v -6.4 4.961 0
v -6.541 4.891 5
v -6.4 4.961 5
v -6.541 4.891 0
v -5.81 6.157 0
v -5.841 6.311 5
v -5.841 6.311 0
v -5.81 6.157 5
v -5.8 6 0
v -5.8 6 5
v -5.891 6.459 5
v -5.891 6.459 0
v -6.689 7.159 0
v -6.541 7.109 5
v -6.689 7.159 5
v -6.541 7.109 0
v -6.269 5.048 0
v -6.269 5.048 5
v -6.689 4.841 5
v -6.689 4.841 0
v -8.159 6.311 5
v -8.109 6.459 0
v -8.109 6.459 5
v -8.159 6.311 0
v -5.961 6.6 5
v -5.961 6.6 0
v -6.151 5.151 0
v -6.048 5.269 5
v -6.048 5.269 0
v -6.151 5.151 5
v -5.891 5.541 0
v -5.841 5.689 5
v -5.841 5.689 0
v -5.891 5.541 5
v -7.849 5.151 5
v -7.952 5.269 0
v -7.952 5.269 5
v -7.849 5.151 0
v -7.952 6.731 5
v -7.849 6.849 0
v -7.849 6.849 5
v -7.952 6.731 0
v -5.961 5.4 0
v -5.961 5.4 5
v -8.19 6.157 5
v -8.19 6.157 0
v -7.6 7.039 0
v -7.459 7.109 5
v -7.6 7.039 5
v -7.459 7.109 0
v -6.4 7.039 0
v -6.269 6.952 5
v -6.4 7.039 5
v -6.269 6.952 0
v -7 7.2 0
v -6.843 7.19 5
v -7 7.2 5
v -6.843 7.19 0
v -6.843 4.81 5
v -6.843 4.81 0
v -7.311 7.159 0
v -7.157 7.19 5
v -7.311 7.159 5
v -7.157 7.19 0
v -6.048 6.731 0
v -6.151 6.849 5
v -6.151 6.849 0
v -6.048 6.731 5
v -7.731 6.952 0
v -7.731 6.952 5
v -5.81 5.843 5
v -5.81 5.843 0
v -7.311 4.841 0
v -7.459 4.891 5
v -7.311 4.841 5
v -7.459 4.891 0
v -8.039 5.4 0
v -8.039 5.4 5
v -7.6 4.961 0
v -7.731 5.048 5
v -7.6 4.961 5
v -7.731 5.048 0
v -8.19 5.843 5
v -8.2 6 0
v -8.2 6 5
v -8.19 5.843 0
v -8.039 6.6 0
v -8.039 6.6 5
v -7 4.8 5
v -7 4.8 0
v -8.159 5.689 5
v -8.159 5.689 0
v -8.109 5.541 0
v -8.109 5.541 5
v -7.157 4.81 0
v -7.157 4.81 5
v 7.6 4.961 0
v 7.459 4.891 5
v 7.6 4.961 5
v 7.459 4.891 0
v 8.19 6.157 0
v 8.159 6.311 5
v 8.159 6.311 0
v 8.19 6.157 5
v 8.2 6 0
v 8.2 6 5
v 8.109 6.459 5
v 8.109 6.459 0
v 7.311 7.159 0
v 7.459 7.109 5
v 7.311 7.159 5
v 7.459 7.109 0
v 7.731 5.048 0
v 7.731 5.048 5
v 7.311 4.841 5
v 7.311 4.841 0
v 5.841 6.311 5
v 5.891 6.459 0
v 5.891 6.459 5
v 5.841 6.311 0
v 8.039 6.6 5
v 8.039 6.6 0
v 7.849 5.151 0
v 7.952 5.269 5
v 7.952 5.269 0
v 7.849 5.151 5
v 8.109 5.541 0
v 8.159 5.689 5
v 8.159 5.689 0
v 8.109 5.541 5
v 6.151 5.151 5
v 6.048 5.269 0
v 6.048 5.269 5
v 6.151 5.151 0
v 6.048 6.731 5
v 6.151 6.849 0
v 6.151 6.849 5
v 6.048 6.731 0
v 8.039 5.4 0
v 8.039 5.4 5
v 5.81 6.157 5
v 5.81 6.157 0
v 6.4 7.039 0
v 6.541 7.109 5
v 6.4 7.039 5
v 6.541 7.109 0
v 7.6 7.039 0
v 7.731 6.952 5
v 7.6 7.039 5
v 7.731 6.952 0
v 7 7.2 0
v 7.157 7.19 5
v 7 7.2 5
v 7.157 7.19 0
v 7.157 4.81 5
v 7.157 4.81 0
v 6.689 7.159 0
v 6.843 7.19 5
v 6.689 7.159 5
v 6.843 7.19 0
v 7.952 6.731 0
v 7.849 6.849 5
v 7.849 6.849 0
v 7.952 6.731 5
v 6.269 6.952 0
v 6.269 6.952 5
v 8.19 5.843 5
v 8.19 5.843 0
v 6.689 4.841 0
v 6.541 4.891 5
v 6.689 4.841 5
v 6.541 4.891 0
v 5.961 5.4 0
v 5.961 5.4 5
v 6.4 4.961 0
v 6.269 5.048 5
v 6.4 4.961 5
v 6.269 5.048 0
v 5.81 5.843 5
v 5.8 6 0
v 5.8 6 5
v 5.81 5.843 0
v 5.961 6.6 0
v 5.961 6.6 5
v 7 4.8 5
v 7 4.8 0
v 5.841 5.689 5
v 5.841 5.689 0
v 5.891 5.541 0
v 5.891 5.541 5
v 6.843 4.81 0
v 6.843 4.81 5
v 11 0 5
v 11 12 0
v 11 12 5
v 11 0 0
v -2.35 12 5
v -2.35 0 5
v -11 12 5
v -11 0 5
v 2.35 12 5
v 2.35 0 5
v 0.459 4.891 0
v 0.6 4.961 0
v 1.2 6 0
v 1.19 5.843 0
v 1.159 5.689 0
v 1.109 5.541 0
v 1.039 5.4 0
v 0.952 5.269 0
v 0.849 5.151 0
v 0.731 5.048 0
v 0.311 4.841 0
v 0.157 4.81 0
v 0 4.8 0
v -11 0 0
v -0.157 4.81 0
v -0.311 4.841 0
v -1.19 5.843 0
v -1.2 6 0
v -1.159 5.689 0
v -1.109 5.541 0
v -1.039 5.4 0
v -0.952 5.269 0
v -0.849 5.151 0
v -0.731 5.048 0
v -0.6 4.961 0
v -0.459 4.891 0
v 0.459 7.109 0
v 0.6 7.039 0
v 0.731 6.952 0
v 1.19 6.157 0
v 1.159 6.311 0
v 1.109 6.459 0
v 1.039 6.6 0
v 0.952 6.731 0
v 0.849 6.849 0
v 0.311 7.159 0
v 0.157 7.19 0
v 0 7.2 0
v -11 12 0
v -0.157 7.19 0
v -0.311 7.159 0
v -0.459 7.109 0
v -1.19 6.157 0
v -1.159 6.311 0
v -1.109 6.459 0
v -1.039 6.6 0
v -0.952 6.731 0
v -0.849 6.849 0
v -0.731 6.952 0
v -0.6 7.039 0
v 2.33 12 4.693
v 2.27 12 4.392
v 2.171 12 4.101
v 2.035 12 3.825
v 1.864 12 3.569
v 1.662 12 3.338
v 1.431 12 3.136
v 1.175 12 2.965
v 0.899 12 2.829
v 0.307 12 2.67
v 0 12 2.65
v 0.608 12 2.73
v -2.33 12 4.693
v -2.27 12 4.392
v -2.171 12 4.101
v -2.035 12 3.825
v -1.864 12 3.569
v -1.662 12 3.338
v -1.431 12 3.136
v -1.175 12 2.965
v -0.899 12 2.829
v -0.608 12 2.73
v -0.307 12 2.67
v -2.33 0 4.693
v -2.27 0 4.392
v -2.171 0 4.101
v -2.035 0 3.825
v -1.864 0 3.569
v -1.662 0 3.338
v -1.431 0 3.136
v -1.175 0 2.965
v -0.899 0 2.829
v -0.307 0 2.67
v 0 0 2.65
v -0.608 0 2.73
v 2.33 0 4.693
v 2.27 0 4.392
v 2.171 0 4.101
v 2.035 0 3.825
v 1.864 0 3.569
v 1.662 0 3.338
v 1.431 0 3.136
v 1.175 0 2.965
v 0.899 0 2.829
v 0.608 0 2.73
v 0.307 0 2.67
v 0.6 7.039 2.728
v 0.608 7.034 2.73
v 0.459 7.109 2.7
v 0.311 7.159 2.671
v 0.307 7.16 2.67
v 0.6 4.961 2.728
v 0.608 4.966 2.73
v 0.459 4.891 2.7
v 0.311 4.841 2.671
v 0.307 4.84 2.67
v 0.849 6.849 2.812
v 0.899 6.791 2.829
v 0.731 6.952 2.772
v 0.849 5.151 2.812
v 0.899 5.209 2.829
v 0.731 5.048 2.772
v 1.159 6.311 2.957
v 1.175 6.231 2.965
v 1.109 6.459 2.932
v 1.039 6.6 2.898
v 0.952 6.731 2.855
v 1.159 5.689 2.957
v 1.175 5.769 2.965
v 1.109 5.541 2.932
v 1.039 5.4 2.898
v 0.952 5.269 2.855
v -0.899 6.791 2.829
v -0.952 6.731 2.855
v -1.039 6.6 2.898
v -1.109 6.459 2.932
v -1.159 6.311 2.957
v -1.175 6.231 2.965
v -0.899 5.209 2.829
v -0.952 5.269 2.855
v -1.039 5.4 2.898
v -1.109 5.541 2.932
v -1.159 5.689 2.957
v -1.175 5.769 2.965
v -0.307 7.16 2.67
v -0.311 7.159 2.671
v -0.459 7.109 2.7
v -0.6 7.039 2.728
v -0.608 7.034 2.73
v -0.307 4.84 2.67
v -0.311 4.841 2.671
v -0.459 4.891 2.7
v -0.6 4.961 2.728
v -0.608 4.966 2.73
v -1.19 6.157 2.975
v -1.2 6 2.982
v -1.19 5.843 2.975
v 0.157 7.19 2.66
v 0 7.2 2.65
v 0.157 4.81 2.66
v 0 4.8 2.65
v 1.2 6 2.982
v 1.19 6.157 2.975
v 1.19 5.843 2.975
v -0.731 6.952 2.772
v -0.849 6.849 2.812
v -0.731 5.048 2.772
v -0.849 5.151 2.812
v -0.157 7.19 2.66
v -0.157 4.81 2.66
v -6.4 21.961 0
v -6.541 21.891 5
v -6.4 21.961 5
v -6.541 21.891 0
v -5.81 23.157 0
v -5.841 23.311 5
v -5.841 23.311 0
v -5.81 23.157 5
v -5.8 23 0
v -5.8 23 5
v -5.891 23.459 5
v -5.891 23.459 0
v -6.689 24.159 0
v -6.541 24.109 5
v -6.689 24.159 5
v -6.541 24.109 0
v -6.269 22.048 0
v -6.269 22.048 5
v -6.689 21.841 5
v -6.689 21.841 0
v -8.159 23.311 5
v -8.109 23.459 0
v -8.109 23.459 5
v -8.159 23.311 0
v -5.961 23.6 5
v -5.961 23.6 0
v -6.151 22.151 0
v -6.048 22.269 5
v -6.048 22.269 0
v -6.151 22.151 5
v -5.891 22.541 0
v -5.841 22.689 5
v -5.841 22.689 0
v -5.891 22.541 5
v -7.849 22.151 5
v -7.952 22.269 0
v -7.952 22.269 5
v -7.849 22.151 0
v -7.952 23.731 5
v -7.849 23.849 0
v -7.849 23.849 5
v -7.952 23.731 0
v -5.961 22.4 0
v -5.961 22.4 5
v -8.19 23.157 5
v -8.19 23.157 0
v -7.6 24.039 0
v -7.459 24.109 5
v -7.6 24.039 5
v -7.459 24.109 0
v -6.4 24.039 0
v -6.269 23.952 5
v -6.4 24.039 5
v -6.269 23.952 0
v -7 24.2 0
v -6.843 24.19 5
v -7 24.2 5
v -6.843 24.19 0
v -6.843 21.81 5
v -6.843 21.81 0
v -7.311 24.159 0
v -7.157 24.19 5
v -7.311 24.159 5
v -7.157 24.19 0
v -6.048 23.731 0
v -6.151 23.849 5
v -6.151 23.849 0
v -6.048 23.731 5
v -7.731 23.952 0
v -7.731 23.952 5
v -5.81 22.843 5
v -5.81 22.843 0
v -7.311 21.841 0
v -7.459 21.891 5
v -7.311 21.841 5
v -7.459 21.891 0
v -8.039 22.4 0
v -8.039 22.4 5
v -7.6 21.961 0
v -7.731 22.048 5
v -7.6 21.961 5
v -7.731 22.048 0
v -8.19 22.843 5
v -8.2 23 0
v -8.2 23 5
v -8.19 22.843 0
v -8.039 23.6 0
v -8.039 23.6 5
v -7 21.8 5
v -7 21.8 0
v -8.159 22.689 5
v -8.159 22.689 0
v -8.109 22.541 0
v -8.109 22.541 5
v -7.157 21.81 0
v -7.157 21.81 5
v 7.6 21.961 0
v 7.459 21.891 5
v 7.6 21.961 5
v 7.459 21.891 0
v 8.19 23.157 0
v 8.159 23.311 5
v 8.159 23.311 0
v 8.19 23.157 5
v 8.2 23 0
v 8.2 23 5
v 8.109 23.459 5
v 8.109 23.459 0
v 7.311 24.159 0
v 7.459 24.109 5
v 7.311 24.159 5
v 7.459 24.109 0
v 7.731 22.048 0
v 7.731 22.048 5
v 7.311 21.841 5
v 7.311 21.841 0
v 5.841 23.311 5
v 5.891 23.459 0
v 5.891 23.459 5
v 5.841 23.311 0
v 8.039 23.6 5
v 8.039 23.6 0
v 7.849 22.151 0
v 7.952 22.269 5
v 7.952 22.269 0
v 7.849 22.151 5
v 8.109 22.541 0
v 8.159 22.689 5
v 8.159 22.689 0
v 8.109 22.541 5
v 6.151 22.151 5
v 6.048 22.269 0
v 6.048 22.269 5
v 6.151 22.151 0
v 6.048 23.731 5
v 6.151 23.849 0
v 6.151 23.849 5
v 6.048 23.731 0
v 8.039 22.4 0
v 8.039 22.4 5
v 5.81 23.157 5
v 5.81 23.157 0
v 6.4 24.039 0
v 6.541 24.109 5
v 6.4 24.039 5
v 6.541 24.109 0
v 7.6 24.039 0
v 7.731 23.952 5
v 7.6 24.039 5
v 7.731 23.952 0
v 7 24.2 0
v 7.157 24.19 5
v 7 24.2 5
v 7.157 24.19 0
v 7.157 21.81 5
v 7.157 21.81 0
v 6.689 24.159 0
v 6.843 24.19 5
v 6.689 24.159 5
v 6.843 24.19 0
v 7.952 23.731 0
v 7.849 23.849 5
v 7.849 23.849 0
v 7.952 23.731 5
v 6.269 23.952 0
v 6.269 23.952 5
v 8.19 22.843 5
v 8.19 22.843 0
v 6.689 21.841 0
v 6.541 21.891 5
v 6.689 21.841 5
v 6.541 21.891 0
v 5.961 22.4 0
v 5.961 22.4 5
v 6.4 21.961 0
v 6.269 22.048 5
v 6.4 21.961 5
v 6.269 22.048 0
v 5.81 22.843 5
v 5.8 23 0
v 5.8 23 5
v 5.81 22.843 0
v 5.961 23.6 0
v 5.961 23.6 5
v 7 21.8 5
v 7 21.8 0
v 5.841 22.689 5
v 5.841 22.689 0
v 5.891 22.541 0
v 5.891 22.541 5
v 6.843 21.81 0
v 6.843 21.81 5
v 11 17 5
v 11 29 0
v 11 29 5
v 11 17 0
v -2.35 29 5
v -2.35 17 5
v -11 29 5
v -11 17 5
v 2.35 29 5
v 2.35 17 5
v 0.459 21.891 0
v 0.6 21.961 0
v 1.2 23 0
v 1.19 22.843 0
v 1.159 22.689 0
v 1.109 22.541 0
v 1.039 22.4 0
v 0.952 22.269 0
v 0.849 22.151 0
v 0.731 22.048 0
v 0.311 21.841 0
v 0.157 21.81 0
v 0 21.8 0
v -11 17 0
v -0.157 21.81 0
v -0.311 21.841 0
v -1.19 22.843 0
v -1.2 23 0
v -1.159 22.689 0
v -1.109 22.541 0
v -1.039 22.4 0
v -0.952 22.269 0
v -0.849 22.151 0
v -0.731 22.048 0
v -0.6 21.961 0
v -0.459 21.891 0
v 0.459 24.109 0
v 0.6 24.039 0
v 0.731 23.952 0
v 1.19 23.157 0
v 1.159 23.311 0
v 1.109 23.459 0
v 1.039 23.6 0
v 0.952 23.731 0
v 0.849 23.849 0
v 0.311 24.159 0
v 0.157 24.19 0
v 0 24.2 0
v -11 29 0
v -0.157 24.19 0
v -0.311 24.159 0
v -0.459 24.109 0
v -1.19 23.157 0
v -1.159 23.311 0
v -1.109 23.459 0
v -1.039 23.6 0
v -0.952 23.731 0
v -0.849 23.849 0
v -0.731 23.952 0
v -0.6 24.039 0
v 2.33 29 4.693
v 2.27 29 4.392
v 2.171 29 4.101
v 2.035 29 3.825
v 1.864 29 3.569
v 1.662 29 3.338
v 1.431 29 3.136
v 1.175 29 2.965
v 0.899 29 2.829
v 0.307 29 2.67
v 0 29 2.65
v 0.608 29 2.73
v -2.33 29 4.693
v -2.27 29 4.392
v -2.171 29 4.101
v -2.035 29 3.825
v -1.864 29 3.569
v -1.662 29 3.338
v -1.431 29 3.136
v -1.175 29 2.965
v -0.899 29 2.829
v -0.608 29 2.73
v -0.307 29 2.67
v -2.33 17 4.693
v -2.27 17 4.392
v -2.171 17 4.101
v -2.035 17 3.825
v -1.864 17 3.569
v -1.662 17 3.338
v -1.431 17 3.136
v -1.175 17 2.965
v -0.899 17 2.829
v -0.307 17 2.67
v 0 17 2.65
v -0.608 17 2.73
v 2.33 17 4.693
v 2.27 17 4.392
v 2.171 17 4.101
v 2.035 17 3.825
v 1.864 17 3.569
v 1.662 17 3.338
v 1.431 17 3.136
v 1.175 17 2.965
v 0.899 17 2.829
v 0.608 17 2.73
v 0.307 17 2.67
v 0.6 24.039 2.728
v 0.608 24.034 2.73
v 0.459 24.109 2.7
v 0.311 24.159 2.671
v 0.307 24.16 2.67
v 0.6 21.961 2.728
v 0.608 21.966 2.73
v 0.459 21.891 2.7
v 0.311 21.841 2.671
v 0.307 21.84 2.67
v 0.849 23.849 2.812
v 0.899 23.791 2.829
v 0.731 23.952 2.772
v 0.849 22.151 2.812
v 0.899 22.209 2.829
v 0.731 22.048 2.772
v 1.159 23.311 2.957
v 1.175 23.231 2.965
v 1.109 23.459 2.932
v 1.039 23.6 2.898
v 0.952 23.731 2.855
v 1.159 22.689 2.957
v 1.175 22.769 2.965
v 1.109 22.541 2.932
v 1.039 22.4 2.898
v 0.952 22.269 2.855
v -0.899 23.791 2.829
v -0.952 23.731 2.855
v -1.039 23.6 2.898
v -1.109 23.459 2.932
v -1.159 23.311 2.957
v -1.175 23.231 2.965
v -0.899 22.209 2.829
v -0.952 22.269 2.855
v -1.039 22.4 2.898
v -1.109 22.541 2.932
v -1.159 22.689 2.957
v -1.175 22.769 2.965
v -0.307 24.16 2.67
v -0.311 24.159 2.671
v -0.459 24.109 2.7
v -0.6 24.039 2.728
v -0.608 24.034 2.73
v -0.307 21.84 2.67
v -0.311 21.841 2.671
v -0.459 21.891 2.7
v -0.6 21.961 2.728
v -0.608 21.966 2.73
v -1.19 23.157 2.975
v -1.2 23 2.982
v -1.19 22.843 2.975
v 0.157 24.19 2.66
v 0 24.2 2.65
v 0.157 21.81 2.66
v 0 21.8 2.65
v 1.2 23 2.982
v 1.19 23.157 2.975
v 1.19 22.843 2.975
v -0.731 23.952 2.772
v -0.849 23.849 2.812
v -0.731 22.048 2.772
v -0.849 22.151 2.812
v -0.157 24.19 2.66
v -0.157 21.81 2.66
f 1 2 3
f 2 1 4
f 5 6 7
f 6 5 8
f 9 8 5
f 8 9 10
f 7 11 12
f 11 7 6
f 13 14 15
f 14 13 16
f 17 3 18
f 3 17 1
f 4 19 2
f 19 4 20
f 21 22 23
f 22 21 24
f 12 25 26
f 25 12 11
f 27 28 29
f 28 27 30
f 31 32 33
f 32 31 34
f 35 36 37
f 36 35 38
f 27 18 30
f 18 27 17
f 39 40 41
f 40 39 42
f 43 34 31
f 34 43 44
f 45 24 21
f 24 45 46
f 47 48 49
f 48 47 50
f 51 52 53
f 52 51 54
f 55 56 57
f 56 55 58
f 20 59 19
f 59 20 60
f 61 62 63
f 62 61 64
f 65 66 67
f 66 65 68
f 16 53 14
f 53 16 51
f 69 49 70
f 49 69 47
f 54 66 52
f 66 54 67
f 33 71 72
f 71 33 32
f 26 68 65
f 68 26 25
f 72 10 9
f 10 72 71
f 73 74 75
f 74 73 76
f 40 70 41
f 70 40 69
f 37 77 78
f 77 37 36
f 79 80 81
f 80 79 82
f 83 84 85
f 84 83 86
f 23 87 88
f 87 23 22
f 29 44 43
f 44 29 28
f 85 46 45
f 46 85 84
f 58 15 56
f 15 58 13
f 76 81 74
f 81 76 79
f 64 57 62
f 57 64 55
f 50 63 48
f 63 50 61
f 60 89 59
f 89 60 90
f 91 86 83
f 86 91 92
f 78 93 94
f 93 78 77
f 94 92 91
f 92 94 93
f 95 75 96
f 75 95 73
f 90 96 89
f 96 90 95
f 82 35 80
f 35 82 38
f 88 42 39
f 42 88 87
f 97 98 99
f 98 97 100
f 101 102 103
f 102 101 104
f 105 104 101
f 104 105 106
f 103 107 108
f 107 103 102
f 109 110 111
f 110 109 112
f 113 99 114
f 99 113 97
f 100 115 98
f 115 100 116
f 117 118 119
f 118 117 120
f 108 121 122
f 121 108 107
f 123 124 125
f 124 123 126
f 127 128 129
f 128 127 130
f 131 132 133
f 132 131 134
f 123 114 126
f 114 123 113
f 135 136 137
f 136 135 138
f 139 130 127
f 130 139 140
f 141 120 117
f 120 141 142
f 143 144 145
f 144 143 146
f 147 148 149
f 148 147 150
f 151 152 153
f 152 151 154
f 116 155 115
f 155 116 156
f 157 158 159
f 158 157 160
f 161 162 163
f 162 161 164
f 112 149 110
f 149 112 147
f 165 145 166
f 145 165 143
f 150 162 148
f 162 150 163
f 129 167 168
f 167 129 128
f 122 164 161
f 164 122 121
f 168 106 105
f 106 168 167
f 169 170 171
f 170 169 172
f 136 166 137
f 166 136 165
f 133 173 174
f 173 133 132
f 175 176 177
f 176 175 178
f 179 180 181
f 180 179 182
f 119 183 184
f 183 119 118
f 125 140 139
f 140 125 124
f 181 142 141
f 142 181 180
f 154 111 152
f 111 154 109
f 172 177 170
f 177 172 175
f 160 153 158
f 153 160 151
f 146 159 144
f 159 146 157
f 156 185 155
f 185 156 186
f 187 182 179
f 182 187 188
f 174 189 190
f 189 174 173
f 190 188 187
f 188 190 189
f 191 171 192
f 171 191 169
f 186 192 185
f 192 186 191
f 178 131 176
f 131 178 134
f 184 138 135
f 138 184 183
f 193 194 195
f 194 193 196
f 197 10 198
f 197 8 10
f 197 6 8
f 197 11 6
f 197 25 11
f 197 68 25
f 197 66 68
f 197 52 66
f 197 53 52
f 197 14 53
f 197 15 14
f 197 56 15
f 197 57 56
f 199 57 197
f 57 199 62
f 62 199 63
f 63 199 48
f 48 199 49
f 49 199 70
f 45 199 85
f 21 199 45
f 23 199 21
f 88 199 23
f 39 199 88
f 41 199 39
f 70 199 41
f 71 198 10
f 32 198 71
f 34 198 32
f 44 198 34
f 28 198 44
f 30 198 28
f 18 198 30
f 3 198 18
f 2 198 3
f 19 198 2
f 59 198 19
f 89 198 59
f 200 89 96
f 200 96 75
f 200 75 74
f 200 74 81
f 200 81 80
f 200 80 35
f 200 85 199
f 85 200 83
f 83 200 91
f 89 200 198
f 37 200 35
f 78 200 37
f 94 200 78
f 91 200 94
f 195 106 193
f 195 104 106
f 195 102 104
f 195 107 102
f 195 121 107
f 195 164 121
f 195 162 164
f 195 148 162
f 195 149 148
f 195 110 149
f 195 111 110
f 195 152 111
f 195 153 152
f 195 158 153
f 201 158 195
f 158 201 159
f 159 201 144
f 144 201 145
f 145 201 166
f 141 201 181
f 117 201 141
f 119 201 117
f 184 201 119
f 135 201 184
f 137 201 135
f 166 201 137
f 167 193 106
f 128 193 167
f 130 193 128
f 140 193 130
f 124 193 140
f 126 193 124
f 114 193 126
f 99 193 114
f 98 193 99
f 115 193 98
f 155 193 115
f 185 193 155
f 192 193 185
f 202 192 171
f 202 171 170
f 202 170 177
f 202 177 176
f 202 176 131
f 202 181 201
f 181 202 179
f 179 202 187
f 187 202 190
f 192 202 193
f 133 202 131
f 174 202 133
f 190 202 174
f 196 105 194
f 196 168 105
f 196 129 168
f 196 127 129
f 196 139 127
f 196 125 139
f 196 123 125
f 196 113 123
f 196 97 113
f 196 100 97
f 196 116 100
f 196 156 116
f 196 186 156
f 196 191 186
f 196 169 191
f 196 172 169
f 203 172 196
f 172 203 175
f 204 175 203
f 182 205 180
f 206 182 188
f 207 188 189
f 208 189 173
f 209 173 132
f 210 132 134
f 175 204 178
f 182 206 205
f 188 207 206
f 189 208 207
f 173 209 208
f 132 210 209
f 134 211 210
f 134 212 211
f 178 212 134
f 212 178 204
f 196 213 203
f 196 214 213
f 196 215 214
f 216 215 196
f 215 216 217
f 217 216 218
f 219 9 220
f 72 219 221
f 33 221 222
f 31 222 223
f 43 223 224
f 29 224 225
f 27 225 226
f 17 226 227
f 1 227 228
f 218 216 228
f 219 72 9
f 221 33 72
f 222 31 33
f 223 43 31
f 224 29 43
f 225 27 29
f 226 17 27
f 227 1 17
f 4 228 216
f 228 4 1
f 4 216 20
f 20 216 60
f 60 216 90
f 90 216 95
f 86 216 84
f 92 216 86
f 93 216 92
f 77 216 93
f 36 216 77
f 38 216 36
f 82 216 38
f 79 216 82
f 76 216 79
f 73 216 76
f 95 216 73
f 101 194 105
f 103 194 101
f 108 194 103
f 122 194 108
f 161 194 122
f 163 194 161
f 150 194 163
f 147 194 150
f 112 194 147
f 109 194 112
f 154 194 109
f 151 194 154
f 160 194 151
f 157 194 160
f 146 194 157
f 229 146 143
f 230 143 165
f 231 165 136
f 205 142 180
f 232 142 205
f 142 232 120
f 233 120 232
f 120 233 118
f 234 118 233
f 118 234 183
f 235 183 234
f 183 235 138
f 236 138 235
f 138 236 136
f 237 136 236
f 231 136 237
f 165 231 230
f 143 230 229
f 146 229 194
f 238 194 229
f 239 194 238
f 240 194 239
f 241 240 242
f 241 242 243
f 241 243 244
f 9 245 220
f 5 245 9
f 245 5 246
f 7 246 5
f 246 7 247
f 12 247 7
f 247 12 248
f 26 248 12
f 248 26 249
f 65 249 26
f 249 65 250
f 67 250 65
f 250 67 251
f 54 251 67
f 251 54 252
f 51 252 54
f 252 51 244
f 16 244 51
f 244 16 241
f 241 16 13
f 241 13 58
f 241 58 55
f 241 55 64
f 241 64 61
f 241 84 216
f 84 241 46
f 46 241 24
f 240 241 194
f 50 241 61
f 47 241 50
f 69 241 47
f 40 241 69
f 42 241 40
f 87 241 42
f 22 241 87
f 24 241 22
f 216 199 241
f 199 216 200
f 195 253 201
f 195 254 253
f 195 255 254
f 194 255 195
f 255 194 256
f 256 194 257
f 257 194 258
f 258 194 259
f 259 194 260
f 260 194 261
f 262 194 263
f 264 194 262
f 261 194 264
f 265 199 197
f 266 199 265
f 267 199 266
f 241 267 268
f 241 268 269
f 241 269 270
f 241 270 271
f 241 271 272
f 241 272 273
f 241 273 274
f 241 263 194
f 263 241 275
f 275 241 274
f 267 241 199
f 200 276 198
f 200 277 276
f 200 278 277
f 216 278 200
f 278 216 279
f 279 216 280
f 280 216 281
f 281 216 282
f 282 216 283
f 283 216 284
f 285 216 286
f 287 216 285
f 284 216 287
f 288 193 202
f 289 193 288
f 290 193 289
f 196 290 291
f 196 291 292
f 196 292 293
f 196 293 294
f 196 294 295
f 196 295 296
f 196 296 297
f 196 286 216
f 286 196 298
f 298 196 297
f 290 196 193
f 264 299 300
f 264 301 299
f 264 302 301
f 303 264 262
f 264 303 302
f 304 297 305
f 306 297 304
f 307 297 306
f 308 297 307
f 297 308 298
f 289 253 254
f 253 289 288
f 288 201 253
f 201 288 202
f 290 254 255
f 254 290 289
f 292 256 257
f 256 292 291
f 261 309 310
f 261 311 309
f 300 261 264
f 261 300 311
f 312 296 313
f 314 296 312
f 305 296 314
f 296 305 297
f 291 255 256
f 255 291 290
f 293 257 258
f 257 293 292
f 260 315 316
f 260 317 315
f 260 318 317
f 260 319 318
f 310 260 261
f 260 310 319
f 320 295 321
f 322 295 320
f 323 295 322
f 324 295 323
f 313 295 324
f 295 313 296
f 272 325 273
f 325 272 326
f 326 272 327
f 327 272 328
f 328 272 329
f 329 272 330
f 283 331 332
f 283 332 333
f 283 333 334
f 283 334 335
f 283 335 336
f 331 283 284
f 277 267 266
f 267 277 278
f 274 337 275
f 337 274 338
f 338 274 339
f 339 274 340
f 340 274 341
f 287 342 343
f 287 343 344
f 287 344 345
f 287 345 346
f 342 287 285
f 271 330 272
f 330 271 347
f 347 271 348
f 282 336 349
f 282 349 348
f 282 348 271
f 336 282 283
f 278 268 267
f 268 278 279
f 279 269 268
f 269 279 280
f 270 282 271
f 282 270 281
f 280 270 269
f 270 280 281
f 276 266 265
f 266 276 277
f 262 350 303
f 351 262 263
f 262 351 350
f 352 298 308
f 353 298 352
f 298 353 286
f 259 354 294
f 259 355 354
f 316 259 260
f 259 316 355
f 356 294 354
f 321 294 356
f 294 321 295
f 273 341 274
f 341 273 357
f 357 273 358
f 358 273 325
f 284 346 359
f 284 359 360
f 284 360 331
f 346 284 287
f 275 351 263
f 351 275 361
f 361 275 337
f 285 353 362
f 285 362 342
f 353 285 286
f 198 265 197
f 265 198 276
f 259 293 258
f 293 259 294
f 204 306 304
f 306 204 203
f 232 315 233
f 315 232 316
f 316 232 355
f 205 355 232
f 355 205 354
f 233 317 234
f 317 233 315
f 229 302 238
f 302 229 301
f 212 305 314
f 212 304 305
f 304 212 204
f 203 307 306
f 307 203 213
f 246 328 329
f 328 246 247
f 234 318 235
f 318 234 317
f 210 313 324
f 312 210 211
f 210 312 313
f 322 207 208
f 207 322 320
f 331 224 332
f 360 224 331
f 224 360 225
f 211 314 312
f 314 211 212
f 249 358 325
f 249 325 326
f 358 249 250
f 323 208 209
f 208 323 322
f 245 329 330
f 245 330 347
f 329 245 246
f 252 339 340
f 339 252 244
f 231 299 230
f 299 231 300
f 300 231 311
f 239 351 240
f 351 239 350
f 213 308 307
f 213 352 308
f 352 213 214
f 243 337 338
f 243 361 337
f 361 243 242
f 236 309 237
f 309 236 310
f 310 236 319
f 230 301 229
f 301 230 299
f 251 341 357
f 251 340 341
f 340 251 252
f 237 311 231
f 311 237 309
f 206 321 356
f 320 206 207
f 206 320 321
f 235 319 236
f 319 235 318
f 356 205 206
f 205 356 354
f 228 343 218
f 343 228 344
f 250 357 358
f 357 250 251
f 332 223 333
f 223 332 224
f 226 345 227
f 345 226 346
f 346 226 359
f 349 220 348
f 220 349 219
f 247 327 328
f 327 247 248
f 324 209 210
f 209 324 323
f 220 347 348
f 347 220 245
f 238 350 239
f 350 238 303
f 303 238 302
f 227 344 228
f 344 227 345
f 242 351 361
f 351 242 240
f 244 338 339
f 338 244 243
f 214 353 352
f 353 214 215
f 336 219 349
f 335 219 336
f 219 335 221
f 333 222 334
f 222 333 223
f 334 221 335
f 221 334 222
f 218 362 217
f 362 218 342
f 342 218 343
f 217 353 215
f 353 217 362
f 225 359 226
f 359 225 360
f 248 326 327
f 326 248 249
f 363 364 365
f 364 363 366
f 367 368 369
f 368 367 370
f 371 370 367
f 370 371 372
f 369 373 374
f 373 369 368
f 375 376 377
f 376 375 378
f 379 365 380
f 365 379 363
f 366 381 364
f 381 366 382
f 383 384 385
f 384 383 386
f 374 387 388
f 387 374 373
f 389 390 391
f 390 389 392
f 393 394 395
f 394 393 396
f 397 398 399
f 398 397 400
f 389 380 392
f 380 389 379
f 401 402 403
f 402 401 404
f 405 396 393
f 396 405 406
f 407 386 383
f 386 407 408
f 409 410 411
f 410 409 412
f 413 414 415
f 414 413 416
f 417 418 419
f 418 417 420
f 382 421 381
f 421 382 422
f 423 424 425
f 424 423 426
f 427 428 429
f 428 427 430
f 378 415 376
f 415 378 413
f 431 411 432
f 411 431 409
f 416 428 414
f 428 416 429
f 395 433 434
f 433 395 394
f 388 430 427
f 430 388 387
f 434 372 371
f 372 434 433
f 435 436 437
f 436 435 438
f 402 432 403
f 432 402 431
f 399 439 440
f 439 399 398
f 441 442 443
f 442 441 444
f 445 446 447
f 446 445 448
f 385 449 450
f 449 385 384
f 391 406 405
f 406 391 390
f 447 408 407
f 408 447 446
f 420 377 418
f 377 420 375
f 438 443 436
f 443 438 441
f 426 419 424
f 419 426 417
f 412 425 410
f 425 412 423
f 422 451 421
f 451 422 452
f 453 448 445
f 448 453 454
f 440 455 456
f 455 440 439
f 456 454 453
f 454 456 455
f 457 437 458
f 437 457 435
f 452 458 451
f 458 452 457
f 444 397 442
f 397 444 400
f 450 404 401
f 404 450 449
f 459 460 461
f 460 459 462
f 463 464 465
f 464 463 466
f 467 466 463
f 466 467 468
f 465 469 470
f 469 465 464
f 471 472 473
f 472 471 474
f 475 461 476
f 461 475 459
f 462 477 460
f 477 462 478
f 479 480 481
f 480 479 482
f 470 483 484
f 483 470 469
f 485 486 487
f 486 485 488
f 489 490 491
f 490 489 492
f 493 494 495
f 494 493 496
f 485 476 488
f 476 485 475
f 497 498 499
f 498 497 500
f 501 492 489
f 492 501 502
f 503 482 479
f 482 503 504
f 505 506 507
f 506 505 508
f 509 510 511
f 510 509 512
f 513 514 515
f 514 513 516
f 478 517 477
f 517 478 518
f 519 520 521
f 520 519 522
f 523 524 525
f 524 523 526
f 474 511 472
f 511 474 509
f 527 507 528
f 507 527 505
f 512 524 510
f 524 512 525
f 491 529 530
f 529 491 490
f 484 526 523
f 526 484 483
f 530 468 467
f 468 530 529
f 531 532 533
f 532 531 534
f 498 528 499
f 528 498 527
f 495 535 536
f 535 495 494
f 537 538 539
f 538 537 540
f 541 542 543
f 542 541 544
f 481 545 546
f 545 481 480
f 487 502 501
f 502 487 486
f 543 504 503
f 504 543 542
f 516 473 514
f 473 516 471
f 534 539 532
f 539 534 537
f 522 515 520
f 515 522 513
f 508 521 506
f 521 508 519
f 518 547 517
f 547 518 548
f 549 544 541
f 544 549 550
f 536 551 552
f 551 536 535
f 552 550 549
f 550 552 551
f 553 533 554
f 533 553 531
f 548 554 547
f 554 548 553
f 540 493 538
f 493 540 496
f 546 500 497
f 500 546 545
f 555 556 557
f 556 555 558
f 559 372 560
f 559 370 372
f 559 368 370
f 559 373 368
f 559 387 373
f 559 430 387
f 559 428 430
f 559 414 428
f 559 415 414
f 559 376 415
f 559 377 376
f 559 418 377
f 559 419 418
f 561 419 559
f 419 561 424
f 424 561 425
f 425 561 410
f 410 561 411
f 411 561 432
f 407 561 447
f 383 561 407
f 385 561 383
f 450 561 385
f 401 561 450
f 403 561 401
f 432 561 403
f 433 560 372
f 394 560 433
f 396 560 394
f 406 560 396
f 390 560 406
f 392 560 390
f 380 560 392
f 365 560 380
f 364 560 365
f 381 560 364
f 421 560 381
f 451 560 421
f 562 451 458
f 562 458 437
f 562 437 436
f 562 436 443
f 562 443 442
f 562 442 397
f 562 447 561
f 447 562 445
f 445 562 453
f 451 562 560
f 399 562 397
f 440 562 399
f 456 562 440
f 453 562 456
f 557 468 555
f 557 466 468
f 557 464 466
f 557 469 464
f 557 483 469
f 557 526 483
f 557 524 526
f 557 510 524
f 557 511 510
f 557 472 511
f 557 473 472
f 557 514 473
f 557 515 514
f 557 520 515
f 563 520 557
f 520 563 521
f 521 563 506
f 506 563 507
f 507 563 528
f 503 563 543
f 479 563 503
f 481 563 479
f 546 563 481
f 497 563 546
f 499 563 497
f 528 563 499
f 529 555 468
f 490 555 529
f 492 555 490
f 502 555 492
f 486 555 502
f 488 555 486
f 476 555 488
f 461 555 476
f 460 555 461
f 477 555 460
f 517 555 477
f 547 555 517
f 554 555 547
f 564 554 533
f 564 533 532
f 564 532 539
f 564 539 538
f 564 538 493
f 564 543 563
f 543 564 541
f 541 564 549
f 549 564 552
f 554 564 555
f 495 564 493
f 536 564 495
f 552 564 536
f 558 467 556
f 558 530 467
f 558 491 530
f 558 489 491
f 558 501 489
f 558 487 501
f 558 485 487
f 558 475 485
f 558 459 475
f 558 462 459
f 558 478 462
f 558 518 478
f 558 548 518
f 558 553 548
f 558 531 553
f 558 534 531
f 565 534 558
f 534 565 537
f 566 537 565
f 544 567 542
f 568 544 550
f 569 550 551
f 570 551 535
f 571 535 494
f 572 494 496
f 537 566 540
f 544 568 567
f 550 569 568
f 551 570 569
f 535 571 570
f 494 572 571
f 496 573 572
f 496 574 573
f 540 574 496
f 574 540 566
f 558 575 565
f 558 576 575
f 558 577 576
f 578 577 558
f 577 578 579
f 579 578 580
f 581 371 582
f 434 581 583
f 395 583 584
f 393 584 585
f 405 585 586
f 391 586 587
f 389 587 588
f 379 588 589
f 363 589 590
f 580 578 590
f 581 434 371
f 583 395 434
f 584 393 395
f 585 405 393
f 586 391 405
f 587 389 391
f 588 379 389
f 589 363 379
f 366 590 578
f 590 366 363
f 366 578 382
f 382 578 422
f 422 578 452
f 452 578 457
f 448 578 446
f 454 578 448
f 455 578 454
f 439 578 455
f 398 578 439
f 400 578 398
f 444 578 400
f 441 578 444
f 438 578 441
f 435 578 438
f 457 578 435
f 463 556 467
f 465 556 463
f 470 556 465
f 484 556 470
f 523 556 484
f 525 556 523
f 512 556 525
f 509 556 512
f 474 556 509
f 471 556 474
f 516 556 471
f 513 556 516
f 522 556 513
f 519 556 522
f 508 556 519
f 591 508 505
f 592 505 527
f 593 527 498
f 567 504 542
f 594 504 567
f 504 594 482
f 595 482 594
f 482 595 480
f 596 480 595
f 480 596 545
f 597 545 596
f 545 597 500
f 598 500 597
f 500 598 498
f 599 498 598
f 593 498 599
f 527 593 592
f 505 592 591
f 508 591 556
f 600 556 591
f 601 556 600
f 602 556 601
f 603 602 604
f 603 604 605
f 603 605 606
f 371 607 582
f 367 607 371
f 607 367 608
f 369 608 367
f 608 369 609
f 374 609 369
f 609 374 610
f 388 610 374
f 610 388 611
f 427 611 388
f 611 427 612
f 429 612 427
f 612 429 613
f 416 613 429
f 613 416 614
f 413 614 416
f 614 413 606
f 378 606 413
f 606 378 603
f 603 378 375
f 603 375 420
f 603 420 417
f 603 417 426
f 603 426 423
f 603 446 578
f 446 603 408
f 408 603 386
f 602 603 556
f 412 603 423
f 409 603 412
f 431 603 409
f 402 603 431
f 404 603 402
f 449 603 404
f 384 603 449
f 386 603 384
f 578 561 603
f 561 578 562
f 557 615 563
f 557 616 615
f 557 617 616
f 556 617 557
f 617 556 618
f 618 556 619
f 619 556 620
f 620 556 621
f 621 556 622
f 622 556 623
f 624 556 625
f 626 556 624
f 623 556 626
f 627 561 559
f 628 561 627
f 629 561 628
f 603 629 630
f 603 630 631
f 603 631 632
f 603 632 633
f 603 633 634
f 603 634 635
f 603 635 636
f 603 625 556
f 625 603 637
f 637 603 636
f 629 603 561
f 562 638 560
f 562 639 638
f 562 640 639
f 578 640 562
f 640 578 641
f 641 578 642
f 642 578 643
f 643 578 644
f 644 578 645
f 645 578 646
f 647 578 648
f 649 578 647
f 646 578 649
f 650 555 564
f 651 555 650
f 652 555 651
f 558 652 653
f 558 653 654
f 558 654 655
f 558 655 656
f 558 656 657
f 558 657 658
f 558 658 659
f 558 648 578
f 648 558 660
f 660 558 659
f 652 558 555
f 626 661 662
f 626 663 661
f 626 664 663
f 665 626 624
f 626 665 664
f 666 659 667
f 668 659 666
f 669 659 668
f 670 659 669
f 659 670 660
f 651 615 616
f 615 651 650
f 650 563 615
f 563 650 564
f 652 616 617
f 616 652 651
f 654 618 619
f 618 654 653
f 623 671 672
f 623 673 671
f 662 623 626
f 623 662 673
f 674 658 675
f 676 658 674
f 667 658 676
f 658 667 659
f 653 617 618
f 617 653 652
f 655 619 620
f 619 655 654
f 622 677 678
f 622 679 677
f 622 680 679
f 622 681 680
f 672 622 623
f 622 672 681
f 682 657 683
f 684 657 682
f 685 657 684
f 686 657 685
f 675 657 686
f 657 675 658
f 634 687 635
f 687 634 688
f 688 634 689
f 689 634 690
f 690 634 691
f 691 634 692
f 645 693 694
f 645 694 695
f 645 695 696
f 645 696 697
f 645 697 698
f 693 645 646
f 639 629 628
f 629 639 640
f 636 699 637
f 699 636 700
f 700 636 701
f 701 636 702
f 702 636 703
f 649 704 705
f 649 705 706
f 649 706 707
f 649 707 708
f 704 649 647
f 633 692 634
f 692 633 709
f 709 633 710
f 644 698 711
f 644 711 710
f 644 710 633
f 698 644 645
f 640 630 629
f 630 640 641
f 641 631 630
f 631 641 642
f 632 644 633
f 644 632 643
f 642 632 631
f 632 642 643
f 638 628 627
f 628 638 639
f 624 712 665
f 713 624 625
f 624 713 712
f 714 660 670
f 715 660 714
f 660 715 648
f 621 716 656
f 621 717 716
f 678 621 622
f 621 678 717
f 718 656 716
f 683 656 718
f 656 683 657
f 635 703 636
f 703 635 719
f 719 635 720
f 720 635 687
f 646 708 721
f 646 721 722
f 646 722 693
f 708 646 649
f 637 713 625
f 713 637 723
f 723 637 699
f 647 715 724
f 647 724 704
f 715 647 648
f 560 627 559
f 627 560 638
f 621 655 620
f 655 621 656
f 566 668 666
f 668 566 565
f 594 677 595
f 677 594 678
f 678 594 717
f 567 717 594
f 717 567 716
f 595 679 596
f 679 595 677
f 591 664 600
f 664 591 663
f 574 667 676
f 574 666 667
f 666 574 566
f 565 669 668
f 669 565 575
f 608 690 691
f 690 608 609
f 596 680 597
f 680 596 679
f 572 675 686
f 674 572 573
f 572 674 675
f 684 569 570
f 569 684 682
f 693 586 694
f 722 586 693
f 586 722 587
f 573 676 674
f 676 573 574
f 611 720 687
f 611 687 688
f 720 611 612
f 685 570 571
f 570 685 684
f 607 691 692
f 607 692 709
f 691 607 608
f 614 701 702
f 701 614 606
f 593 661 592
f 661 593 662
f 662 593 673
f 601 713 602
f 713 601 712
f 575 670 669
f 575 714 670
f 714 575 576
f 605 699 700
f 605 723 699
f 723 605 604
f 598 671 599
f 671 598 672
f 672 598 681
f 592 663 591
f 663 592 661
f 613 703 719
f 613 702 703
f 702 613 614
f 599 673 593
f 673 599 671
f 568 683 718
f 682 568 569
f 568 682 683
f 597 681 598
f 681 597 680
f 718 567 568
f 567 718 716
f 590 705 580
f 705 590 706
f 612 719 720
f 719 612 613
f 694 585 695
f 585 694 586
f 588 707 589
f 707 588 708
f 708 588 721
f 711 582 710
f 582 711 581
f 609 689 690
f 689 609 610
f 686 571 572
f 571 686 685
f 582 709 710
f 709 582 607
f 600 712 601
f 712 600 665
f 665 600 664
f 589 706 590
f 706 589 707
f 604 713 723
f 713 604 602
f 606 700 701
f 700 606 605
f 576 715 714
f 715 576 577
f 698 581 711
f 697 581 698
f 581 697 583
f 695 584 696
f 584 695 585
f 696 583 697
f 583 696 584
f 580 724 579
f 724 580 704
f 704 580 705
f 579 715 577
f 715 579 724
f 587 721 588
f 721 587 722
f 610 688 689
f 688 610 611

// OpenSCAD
// file: params.scad
/*
 * params.scad — every dimension the printed parts share, in millimetres.
 * ======================================================================
 * Included by all cad/*.scad files. No dimension may be duplicated in a part
 * file; if two parts need the same number, it lives here.
 *
 * Values marked MEASURE are design targets until caliper measurements of a real
 * X240 top section replace them (issue #44). Everything else is a design choice.
 */

// ---------------------------------------------------------------- deck / case
case_width  = 309.0;   // MEASURE  X, left to right, at the deck's mating surface
case_depth  = 210.0;   // MEASURE  Y, front (palmrest) to back
wall_t      = 2.5;     // PETG shell wall
corner_r    = 3.0;     // MEASURE  outer corner radius
internal_h  = 18.0;    // floor-to-deck clearance (see docs/enclosure/integration.md)
case_h      = internal_h + wall_t;

// Screw bosses that meet the X240 deck, from the front-left corner.  MEASURE all.
deck_boss_positions = [
    [  8.0,   8.0 ], [ 60.0,   8.0 ], [150.0,   8.0 ], [250.0,   8.0 ], [301.0,   8.0 ],
    [  8.0, 202.0 ], [150.0, 202.0 ], [301.0, 202.0 ],
];
boss_od = 6.0;
boss_id = 3.2;         // M2 heat-set insert hole (insert OD ~3.2 for a 3.5 mm body)

// ---------------------------------------------------------------- split joint
split      = true;     // print as two halves (fits a 220 mm bed); false = one piece
split_x    = case_width / 2;
tab_count  = 3;        // dovetail tabs along the floor seam
tab_w      = 14.0;     // tab width at the seam
tab_flare  = 3.0;      // extra width at the tip (dovetail angle)
tab_len    = 10.0;     // how far the tab reaches into the other half
joint_gap  = 0.15;     // clearance per face; tune with a 30 mm coupon
pin_d      = 3.0;      // alignment pins through the front/rear walls
pin_len    = 10.0;

// ---------------------------------------------------------------- board / sled
board_w    = 100.0;    // stripboard or Rev B PCB
board_d    = 80.0;
board_hole_inset = 4.0;                  // M2 holes this far from each board corner
board_hole_d     = 2.4;
sled_margin      = 6.0;                  // sled extends this far past the board
sled_t           = 2.0;
sled_standoff_h  = 6.0;                  // board sits this high above the sled
sled_standoff_od = 5.0;
// sled centre in the case (rear-centre; see docs/enclosure/integration.md)
sled_center = [ case_width / 2, case_depth - 8 - board_d / 2 - sled_margin - 6 ];
// sled-to-case bosses (around the sled, two per half so the sled bridges the seam)
sled_boss_offsets = [ [-56, -46], [56, -46], [-56, 46], [56, 46] ];

// ---------------------------------------------------------------- Pico
pico_w = 51.0;
pico_d = 21.0;
pico_h = 1.0;          // PCB thickness
pico_hole_d = 2.1;     // Pico mounting holes, 11.4 x 47 mm pattern
pico_hole_dx = 47.0;
pico_hole_dy = 11.4;

// ---------------------------------------------------------------- USB
usb_c     = false;                     // false = Micro-USB cutout, true = USB-C
usb_w     = usb_c ? 9.5 : 8.5;
usb_h     = usb_c ? 4.0 : 3.5;
usb_x     = sled_center[0];            // cutout centred on the board
usb_z     = wall_t + sled_t + sled_standoff_h + 1.6;   // bottom of the Pico's connector
cable_d   = 4.5;                       // USB cable jacket diameter
relief_w  = 22.0;                      // strain-relief bezel footprint
relief_d  = 12.0;
relief_h  = 10.0;

// ---------------------------------------------------------------- FPC
fpc_w        = 22.0;   // 40-pin 0.5 mm cable width
fpc_t        = 0.3;
fpc_min_r    = 5.0;    // minimum bend radius
clickpad_fpc_w = 8.0;  // MEASURE  ClickPad cable width
zif_body_w   = 26.0;   // 40-pin ZIF connector body length along the cable edge
zif_body_d   = 6.0;
zif_body_h   = 5.0;
zif_cp_body_w = 12.0;  // ClickPad ZIF body (pin count from probing)

// ---------------------------------------------------------------- gasket, vents, feet
gasket_depth = 1.2;
gasket_width = 2.0;
vents        = false;  // not thermally needed (docs/enclosure/durability.md)
vent_w = 40.0; vent_h = 2.0; vent_count = 4; vent_spacing = 6.0;
ribs         = true;   // two front-to-back stiffening ribs in the floor
rib_t        = 2.0;
rib_h        = 4.0;

foot_d       = 10.0;   // rubber feet, front
foot_recess  = 1.0;
foot_positions = [ [25, 20], [case_width - 25, 20] ];
tilt_positions = [ [25, case_depth - 20], [case_width - 25, case_depth - 20] ];
tilt_h       = 12.0;   // rear riser height
tilt_w       = 30.0;
tilt_d       = 20.0;
tilt_screw_d = 3.4;    // M3 clearance

// ---------------------------------------------------------------- LED light pipe
pipe_d       = 3.0;
pipe_flange_d= 5.0;
pipe_len     = internal_h - 2;
pipe_position = [ sled_center[0] + board_w / 2 + 15, sled_center[1] - 20 ];  // beside the touchpad

// ---------------------------------------------------------------- printing
fit      = 0.2;        // general hole clearance for printed-in-place fits
$fn      = 48;
// main file
/*
 * usb_strain_relief.scad — bezel that grips the USB cable in the case cutout
 * ==========================================================================
 * A pull on the cable loads this block (screwed to the case floor) and the
 * cable jacket pinched in its channel, never the Pico's receptacle.  Print in
 * two halves that bolt together around the cable, or thread the cable through
 * before plugging it into the Pico.
 */
include <params.scad>

channel_d = cable_d + 0.2;

module strain_relief_half() {
    difference() {
        translate([-relief_w / 2, 0, 0]) cube([relief_w, relief_d, relief_h / 2]);
        // cable channel, half round, along Y
        translate([0, -1, relief_h / 2]) rotate([-90, 0, 0]) cylinder(h = relief_d + 2, d = channel_d);
        // ribs that bite the jacket
        for (y = [3, relief_d - 3]) translate([0, y, relief_h / 2]) rotate([-90, 0, 0]) cylinder(h = 1, d = channel_d - 0.6);
        // two M2 bolts clamping the halves
        for (x = [-relief_w / 2 + 4, relief_w / 2 - 4]) translate([x, relief_d / 2, -1]) cylinder(h = relief_h, d = 2.4);
        // M2 hole to the case floor
        translate([0, relief_d / 2, -1]) cylinder(h = relief_h, d = 2.4);
    }
}

strain_relief_half();
translate([0, relief_d + 5, 0]) strain_relief_half();
